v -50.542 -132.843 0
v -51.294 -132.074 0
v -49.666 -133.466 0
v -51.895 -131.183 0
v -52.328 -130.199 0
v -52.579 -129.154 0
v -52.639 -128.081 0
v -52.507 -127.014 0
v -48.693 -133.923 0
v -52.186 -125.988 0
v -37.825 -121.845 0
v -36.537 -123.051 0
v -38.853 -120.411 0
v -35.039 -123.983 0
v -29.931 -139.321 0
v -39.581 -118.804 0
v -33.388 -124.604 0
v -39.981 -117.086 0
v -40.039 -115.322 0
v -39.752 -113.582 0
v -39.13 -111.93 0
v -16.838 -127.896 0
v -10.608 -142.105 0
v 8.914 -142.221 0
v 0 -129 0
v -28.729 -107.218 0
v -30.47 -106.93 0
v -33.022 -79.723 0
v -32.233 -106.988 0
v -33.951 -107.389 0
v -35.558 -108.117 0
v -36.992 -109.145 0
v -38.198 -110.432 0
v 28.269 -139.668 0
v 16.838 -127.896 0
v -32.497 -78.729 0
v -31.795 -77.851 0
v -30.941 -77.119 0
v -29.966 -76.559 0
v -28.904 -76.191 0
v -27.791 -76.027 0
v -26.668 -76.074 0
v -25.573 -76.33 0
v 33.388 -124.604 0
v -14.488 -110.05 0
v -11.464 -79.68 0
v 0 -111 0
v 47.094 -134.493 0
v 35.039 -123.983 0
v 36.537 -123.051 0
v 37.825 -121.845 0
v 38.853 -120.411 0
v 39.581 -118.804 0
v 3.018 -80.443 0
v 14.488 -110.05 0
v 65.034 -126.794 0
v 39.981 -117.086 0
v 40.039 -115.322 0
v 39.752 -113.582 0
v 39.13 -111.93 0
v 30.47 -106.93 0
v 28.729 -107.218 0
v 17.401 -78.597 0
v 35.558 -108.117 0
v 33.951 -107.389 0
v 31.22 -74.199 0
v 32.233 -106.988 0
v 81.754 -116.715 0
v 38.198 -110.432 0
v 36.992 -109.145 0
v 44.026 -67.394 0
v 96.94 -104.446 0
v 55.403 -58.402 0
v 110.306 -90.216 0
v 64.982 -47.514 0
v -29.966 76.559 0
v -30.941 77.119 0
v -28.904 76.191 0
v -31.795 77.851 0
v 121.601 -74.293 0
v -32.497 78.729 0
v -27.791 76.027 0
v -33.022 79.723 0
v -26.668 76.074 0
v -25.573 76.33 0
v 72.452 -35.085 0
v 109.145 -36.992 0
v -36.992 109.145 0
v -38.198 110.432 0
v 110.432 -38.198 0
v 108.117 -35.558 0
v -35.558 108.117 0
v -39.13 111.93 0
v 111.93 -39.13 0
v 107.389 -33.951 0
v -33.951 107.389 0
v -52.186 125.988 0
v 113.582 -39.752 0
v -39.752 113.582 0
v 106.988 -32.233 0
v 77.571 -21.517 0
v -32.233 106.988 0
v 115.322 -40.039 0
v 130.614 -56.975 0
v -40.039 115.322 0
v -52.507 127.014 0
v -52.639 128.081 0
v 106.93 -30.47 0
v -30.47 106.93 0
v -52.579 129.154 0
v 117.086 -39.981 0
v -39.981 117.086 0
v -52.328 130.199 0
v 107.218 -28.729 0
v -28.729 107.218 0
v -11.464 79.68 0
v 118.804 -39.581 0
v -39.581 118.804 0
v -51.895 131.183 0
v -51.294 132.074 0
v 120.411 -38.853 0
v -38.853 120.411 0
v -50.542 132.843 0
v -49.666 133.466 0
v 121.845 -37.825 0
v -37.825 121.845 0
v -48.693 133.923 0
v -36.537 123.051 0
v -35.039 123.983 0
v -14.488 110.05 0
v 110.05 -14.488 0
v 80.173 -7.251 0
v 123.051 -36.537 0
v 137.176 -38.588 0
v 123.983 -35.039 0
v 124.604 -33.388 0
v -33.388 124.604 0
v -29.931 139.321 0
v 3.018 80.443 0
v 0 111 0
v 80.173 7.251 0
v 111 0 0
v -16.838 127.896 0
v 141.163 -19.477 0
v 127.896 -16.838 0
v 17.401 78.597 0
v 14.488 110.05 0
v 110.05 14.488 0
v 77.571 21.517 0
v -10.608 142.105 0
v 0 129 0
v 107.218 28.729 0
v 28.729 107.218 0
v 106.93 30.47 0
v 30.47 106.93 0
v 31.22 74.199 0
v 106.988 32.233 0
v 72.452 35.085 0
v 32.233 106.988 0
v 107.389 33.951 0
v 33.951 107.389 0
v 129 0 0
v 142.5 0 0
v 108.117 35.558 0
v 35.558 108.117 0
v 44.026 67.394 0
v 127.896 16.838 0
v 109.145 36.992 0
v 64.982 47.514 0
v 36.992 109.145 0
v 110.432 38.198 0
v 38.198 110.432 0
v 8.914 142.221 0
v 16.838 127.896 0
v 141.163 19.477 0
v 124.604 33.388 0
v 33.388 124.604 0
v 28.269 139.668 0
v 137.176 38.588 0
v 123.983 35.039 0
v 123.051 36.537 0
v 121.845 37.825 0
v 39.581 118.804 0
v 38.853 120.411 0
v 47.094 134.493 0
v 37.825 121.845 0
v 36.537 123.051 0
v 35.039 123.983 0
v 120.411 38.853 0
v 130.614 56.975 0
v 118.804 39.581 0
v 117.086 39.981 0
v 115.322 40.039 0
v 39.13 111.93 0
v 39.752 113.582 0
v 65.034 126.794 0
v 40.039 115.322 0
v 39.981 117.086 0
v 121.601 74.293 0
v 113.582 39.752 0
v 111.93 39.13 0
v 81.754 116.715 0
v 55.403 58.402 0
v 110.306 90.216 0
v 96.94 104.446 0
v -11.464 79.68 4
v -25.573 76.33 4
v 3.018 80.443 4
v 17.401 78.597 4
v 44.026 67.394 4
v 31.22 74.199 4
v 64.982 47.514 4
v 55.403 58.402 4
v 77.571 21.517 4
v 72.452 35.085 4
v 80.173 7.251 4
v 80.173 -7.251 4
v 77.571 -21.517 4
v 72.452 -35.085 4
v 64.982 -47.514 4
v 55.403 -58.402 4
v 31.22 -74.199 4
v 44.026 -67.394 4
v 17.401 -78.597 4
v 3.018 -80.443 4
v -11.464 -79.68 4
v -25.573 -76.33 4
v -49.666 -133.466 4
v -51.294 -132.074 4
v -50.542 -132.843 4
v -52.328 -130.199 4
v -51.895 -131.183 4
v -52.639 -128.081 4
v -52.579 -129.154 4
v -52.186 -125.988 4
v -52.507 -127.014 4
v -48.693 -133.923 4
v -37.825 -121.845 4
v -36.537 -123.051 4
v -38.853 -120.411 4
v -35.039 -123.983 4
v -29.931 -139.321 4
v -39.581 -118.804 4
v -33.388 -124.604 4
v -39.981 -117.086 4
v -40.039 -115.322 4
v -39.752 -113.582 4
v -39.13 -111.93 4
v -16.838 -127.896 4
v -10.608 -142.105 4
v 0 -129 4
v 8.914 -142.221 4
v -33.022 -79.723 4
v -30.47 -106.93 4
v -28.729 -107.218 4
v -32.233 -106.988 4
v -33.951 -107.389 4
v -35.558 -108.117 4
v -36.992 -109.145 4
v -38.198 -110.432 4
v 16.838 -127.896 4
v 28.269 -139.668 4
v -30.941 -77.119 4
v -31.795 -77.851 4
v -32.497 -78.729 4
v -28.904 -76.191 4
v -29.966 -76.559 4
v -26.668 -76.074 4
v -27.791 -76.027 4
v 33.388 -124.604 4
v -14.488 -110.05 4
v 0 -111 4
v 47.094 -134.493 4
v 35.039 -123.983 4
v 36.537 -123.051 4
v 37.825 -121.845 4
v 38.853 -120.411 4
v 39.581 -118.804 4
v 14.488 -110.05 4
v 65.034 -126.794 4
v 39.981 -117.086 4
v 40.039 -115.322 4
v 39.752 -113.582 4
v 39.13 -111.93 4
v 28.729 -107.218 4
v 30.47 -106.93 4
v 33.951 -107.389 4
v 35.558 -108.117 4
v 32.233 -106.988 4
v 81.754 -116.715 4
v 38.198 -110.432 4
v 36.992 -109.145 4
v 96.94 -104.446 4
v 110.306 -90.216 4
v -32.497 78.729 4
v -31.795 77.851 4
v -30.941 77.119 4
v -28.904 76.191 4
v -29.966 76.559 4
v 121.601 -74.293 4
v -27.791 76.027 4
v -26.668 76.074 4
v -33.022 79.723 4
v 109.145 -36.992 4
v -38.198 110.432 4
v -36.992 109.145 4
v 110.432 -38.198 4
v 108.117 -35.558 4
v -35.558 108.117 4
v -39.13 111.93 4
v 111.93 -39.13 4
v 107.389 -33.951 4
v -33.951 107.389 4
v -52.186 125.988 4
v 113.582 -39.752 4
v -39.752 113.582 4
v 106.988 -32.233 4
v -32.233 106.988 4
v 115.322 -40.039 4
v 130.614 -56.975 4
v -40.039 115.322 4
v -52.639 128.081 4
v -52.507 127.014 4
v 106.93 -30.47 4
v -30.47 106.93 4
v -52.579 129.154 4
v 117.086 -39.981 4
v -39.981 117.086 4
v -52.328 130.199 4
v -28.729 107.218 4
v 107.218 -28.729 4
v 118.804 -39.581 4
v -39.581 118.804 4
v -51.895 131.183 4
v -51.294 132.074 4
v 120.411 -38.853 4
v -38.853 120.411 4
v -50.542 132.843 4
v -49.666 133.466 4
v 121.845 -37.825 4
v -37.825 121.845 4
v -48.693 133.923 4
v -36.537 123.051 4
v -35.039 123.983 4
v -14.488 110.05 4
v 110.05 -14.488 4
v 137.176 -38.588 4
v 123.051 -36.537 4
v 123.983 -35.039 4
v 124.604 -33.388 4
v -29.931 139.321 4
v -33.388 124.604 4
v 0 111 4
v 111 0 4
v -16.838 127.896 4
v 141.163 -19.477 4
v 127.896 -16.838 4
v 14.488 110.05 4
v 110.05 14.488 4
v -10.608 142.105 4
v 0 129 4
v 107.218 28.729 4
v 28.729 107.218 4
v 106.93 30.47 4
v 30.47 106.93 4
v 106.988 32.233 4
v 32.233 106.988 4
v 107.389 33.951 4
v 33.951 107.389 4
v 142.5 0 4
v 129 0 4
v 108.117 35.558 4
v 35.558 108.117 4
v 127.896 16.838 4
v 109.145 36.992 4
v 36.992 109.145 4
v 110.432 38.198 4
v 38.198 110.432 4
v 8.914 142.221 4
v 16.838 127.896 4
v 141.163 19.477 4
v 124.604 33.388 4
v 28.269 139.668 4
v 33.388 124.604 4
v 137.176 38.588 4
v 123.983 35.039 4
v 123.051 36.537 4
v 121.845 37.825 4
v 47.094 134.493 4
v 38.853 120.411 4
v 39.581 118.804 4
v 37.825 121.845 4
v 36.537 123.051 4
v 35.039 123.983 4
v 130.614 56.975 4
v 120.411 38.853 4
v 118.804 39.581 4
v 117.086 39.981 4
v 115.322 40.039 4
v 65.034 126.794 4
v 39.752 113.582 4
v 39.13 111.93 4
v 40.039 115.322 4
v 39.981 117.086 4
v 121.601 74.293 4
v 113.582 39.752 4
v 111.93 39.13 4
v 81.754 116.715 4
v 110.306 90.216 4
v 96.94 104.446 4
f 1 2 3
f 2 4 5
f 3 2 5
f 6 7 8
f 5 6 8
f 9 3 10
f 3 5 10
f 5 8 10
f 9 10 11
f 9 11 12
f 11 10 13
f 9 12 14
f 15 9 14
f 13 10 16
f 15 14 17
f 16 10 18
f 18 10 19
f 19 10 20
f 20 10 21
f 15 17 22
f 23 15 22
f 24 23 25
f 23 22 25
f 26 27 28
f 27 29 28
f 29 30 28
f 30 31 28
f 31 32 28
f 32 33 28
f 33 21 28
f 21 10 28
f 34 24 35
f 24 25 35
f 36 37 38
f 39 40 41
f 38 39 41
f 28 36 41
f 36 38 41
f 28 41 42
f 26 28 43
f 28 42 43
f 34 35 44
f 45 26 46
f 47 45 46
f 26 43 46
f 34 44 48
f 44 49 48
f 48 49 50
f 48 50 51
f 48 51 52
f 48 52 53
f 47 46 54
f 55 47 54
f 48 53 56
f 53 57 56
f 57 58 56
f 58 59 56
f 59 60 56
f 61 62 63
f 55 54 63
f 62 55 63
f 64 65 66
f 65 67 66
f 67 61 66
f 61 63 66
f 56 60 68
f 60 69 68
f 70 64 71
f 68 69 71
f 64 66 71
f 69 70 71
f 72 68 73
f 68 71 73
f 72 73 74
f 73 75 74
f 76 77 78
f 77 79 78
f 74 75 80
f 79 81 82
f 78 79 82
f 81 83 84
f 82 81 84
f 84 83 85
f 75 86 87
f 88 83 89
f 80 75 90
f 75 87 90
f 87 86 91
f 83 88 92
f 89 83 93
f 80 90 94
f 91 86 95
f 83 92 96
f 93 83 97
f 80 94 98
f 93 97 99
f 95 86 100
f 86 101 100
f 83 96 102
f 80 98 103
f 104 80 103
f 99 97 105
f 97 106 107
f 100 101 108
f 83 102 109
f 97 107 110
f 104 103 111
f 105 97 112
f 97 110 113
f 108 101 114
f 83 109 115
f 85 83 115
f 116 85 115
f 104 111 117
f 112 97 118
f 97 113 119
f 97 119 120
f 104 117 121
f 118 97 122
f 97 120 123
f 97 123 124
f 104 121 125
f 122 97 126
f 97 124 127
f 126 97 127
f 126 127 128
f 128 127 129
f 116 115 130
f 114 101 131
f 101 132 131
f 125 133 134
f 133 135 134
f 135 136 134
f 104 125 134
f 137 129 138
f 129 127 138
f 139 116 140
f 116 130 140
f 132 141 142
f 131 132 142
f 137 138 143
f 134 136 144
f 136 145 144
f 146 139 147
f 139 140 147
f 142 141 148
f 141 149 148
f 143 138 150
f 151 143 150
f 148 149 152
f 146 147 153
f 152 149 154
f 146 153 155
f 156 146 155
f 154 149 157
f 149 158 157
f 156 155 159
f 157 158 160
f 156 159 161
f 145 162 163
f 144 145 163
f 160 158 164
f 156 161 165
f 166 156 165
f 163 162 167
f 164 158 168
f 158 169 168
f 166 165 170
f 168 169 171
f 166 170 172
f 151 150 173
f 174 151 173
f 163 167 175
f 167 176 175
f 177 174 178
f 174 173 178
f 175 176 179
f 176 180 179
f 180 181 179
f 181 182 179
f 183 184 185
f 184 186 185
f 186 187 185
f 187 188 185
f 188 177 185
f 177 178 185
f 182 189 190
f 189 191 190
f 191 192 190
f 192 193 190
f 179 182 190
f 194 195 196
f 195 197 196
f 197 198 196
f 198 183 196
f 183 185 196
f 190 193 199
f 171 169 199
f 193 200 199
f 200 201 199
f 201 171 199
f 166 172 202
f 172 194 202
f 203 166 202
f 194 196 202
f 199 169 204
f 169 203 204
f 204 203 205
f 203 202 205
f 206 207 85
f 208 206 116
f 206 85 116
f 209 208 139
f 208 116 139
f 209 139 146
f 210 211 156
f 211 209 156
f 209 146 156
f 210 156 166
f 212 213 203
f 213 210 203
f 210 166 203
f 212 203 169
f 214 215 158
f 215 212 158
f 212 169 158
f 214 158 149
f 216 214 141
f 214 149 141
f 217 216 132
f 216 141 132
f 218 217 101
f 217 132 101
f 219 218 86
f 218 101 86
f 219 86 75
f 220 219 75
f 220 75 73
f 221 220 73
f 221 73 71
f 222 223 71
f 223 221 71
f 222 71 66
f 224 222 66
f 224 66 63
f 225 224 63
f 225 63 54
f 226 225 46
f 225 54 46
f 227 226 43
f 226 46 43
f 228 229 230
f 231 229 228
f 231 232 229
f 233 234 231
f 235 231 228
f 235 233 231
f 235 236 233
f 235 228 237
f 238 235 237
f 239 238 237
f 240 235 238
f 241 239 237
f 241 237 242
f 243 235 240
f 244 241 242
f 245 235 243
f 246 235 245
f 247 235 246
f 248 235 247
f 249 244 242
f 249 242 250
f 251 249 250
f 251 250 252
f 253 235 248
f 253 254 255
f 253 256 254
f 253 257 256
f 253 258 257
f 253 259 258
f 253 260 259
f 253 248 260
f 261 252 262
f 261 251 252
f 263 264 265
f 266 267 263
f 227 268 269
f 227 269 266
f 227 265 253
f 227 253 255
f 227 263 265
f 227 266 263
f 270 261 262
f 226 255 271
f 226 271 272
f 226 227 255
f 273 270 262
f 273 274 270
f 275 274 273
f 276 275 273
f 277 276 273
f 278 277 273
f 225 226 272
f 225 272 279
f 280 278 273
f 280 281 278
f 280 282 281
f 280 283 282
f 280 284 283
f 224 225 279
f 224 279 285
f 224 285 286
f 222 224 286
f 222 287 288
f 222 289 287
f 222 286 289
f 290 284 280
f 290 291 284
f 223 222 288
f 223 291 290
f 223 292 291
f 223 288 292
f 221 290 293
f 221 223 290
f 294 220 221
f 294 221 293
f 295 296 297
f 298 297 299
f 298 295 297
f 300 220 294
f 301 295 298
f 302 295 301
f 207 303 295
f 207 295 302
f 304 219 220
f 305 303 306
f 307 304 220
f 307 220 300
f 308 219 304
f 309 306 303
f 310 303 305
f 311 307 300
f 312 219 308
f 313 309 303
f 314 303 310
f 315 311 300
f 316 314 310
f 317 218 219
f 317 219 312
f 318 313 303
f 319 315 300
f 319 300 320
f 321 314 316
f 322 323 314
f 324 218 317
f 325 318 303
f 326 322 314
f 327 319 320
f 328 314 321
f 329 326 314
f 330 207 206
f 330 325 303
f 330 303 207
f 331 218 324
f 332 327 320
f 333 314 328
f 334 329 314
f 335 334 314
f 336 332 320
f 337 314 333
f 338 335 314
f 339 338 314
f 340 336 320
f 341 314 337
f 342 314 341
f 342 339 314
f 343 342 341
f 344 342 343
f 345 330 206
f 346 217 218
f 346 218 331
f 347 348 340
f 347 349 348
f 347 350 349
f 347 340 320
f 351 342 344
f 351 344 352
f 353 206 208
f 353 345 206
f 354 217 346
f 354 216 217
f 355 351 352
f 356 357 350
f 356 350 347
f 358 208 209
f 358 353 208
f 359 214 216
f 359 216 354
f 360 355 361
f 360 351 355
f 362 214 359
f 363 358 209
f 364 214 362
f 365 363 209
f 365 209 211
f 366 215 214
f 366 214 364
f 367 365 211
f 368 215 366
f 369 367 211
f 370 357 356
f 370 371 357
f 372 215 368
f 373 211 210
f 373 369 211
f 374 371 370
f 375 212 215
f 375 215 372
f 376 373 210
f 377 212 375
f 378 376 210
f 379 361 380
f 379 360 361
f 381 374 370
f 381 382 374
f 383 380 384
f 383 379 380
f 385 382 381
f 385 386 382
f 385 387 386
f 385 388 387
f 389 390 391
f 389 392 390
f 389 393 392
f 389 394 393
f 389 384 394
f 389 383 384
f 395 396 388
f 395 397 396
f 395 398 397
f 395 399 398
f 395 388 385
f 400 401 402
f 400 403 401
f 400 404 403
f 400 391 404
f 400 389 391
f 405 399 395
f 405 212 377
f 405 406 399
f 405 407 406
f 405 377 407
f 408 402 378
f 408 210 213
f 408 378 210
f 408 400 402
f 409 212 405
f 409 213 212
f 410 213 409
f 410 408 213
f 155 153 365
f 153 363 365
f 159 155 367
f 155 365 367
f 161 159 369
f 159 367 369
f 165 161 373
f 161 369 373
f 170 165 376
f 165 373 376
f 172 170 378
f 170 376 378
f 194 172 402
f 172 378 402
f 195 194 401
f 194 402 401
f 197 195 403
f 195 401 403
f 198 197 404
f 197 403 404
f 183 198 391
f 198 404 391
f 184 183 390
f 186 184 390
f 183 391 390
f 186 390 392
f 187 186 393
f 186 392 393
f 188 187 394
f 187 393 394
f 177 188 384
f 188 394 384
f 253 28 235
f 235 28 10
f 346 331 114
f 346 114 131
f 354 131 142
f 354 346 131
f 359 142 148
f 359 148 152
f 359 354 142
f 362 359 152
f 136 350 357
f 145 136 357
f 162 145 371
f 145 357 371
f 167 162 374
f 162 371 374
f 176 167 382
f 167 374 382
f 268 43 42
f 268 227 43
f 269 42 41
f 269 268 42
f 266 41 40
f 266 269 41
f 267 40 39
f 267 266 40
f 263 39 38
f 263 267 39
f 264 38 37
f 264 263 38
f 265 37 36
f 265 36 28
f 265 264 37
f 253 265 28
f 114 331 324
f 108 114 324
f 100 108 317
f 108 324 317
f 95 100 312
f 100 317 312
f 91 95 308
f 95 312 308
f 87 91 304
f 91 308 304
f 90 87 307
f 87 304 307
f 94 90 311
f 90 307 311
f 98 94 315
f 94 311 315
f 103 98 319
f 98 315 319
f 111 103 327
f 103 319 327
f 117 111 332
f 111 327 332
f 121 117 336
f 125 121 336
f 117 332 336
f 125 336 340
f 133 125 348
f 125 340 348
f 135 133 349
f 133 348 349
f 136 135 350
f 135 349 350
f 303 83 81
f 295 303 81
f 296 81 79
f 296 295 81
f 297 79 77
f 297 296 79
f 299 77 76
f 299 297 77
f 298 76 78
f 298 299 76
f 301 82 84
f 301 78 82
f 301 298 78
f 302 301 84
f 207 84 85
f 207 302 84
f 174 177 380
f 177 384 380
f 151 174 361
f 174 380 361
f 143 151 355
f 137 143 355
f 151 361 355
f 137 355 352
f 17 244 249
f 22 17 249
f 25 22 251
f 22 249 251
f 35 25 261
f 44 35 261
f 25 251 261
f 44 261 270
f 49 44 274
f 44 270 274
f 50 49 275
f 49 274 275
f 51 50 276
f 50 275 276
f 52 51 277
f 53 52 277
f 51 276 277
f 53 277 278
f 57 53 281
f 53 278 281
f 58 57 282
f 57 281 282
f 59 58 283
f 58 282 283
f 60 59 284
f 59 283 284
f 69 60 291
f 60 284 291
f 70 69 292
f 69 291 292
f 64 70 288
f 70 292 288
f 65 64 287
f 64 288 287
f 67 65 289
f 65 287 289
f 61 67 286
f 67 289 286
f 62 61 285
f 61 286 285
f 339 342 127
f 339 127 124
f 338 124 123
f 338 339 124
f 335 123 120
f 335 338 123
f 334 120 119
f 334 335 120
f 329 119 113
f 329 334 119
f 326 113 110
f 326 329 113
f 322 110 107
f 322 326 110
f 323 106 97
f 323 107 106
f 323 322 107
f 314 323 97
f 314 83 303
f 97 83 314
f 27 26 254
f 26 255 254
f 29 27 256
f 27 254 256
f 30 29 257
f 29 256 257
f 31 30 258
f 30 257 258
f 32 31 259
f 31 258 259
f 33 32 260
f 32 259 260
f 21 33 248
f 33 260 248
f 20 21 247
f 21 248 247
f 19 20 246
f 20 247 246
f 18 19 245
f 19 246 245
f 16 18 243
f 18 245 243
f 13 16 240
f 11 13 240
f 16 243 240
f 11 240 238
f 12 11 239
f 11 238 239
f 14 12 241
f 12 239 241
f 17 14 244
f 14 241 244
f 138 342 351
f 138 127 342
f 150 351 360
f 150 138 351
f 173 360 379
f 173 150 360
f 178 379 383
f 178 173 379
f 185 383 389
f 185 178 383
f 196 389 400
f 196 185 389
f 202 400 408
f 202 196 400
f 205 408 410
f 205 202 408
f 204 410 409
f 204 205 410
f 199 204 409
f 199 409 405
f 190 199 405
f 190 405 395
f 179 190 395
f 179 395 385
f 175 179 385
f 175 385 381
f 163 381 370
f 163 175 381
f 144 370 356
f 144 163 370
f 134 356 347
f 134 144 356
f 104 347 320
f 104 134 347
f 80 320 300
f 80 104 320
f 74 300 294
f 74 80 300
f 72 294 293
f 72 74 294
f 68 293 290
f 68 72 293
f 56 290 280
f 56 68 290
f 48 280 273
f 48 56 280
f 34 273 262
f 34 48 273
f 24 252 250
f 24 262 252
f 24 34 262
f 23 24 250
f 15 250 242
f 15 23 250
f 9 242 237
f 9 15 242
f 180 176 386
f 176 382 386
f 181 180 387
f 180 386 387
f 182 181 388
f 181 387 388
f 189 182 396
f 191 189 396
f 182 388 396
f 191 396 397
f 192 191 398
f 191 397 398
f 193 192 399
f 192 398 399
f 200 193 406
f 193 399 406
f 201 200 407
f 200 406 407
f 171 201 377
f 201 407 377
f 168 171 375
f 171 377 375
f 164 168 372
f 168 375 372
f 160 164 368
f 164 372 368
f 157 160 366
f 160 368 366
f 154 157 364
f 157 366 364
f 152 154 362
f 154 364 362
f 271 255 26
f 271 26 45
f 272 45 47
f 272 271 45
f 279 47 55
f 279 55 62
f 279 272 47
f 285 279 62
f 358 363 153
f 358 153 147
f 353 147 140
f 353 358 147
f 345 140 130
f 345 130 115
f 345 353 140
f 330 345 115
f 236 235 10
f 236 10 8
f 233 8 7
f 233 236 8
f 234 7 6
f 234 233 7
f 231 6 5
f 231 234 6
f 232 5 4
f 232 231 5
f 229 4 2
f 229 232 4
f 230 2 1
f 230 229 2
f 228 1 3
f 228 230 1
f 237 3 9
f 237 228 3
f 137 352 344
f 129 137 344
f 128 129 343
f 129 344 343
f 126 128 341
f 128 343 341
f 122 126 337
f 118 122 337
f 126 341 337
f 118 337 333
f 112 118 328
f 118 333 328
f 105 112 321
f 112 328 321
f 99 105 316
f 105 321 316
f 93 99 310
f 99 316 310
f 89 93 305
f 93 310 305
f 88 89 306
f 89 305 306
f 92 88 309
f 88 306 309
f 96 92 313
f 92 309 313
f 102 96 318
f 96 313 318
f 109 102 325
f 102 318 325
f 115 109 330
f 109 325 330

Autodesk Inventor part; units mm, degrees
ref_plane "YZ Plane" through (0, 0, 0) normal (1, 0, 0) x (0, 1, 0)
ref_plane "XZ Plane" through (0, 0, 0) normal (0, 1, 0) x (-1, 0, 0)
ref_plane "XY Plane" through (0, 0, 0) normal (0, 0, 1) x (1, 0, 0)
sketch "Sketch2" plane through (0, 0, 0) normal (0, 0, 1) x (1, 0, 0)
  circle A0 centre (0, 0) radius 80.5
  circle A1 centre (0, 0) radius 142.5
  line L0 (0, 0) -> (-54.5324, 131.6528)
  line L1 (0, 0) -> (-54.5324, -131.6528)
  line L2 (0, 0) -> (-142.5, 0) construction
  point P0 (-30.806, -74.3723)
  point P1 (-30.806, 74.3723)
  dimension "d25" = 161
  dimension "d27" = 285
  dimension "d29" = 135
extrude "Plate2" add sketch "Sketch2" along normal blind 4 contours A0 L0 A1 L1 picked at (65.8732, 102.2302)
sketch "Sketch3" plane through (0, 0, 4) normal (0, 0, 1) x (1, 0, 0)
  circle A0 centre (0, 0) radius 120 construction
  arc A1 (31.0583, 115.9111) -> (-31.0583, 115.9111) centre (0, 0) ccw construction
  arc A2 (33.3877, 124.6044) -> (-33.3877, 124.6044) centre (0, 0) ccw
  arc A3 (28.7289, 107.2178) -> (-28.7289, 107.2178) centre (0, 0) ccw
  arc A4 (28.7289, 107.2178) -> (33.3877, 124.6044) centre (31.0583, 115.9111) ccw
  arc A5 (-33.3877, 124.6044) -> (-28.7289, 107.2178) centre (-31.0583, 115.9111) ccw
  line L0 (-31.0583, 115.9111) -> (0, 0)
  line L1 (0, 0) -> (31.0583, 115.9111)
  line L2 (0, 0) -> (0, 70.9879)
  dimension "d28" = 240
  dimension "d30" = 18
  dimension "d31" = 30
extrude "Cut1" cut sketch "Sketch3" against normal blind 4 contours A4 A3 A5 A2
pattern_circular "Circular Pattern1" count 4 over 360 about axis through (0, 0, 0) along (0, 0, 1) of "Cut1"
fillet "Corner Round1" radius 6 4 edges at (-54.5324, 131.6528, 2) (-30.806, 74.3723, 2) (-30.806, -74.3723, 2) (-54.5324, -131.6528, 2)
sketch "Sketch5" plane through (0, 0, 0) normal (0, 0, -1) x (-1, 0, 0)
  arc A0 (-107.2178, 28.7289) -> (-107.2178, -28.7289) centre (0, 0) ccw projected
  arc A1 (-124.6044, -33.3877) -> (-107.2178, -28.7289) centre (-115.9111, -31.0583) ccw projected
  arc A2 (-124.6044, 33.3877) -> (-124.6044, -33.3877) centre (0, 0) ccw projected
  arc A3 (-107.2178, 28.7289) -> (-124.6044, 33.3877) centre (-115.9111, 31.0583) ccw projected
  arc A4 (-28.7289, -107.2178) -> (28.7289, -107.2178) centre (0, 0) ccw projected
  arc A5 (33.3877, -124.6044) -> (28.7289, -107.2178) centre (31.0583, -115.9111) ccw projected
  arc A6 (-33.3877, -124.6044) -> (33.3877, -124.6044) centre (0, 0) ccw projected
  arc A7 (-28.7289, -107.2178) -> (-33.3877, -124.6044) centre (-31.0583, -115.9111) ccw projected
  arc A8 (28.7289, 107.2178) -> (-28.7289, 107.2178) centre (0, 0) ccw projected
  arc A9 (-33.3877, 124.6044) -> (-28.7289, 107.2178) centre (-31.0583, 115.9111) ccw projected
  arc A10 (33.3877, 124.6044) -> (-33.3877, 124.6044) centre (0, 0) ccw projected
  arc A11 (28.7289, 107.2178) -> (33.3877, 124.6044) centre (31.0583, 115.9111) ccw projected
  arc A12 (48.6927, -133.9226) -> (52.1858, -125.9877) centre (46.6425, -128.2838) ccw projected
  line L0 (33.0224, -79.7231) -> (52.1858, -125.9877) projected
  arc A13 (33.0224, -79.7231) -> (25.573, -76.33) centre (27.4791, -82.0192) ccw projected
  arc A14 (25.573, 76.33) -> (25.573, -76.33) centre (0, 0) ccw projected
  arc A15 (25.573, 76.33) -> (33.0224, 79.7231) centre (27.4791, 82.0192) ccw projected
  line L1 (52.1858, 125.9877) -> (33.0224, 79.7231) projected
  arc A16 (52.1858, 125.9877) -> (48.6927, 133.9226) centre (46.6425, 128.2838) ccw projected
  arc A17 (48.6927, 133.9226) -> (48.6927, -133.9226) centre (0, 0) ccw projected
  line L2 (14.6903, 87.3165) -> (-84.3637, 63.9504)
  line L3 (-84.3637, 63.9504) -> (-84.3637, -55.2862)
  line L4 (-84.3637, -55.2862) -> (17.3285, -91.5935)
equation "\"d17\" = Thickness"
equation "\"d14\" = Thickness"
equation "\"BendReliefWidth\" = Thickness"
equation "\"BendReliefDepth\" = 0.5 * Thickness"
equation "\"CornerReliefSize\" = 4 * Thickness"
equation "\"MinimumRemnant\" = 2 * Thickness"
equation "\"TransitionRadius\" = BendRadius"
equation "\"JacobiRadiusSize\" = BendRadius"
equation "\"GapSize\" = Thickness"
equation "\"Thickness\" = 4"
equation "\"BendRadius\" = 6"
properties part number "PNS 1707 funnel flange" material "Steel"
